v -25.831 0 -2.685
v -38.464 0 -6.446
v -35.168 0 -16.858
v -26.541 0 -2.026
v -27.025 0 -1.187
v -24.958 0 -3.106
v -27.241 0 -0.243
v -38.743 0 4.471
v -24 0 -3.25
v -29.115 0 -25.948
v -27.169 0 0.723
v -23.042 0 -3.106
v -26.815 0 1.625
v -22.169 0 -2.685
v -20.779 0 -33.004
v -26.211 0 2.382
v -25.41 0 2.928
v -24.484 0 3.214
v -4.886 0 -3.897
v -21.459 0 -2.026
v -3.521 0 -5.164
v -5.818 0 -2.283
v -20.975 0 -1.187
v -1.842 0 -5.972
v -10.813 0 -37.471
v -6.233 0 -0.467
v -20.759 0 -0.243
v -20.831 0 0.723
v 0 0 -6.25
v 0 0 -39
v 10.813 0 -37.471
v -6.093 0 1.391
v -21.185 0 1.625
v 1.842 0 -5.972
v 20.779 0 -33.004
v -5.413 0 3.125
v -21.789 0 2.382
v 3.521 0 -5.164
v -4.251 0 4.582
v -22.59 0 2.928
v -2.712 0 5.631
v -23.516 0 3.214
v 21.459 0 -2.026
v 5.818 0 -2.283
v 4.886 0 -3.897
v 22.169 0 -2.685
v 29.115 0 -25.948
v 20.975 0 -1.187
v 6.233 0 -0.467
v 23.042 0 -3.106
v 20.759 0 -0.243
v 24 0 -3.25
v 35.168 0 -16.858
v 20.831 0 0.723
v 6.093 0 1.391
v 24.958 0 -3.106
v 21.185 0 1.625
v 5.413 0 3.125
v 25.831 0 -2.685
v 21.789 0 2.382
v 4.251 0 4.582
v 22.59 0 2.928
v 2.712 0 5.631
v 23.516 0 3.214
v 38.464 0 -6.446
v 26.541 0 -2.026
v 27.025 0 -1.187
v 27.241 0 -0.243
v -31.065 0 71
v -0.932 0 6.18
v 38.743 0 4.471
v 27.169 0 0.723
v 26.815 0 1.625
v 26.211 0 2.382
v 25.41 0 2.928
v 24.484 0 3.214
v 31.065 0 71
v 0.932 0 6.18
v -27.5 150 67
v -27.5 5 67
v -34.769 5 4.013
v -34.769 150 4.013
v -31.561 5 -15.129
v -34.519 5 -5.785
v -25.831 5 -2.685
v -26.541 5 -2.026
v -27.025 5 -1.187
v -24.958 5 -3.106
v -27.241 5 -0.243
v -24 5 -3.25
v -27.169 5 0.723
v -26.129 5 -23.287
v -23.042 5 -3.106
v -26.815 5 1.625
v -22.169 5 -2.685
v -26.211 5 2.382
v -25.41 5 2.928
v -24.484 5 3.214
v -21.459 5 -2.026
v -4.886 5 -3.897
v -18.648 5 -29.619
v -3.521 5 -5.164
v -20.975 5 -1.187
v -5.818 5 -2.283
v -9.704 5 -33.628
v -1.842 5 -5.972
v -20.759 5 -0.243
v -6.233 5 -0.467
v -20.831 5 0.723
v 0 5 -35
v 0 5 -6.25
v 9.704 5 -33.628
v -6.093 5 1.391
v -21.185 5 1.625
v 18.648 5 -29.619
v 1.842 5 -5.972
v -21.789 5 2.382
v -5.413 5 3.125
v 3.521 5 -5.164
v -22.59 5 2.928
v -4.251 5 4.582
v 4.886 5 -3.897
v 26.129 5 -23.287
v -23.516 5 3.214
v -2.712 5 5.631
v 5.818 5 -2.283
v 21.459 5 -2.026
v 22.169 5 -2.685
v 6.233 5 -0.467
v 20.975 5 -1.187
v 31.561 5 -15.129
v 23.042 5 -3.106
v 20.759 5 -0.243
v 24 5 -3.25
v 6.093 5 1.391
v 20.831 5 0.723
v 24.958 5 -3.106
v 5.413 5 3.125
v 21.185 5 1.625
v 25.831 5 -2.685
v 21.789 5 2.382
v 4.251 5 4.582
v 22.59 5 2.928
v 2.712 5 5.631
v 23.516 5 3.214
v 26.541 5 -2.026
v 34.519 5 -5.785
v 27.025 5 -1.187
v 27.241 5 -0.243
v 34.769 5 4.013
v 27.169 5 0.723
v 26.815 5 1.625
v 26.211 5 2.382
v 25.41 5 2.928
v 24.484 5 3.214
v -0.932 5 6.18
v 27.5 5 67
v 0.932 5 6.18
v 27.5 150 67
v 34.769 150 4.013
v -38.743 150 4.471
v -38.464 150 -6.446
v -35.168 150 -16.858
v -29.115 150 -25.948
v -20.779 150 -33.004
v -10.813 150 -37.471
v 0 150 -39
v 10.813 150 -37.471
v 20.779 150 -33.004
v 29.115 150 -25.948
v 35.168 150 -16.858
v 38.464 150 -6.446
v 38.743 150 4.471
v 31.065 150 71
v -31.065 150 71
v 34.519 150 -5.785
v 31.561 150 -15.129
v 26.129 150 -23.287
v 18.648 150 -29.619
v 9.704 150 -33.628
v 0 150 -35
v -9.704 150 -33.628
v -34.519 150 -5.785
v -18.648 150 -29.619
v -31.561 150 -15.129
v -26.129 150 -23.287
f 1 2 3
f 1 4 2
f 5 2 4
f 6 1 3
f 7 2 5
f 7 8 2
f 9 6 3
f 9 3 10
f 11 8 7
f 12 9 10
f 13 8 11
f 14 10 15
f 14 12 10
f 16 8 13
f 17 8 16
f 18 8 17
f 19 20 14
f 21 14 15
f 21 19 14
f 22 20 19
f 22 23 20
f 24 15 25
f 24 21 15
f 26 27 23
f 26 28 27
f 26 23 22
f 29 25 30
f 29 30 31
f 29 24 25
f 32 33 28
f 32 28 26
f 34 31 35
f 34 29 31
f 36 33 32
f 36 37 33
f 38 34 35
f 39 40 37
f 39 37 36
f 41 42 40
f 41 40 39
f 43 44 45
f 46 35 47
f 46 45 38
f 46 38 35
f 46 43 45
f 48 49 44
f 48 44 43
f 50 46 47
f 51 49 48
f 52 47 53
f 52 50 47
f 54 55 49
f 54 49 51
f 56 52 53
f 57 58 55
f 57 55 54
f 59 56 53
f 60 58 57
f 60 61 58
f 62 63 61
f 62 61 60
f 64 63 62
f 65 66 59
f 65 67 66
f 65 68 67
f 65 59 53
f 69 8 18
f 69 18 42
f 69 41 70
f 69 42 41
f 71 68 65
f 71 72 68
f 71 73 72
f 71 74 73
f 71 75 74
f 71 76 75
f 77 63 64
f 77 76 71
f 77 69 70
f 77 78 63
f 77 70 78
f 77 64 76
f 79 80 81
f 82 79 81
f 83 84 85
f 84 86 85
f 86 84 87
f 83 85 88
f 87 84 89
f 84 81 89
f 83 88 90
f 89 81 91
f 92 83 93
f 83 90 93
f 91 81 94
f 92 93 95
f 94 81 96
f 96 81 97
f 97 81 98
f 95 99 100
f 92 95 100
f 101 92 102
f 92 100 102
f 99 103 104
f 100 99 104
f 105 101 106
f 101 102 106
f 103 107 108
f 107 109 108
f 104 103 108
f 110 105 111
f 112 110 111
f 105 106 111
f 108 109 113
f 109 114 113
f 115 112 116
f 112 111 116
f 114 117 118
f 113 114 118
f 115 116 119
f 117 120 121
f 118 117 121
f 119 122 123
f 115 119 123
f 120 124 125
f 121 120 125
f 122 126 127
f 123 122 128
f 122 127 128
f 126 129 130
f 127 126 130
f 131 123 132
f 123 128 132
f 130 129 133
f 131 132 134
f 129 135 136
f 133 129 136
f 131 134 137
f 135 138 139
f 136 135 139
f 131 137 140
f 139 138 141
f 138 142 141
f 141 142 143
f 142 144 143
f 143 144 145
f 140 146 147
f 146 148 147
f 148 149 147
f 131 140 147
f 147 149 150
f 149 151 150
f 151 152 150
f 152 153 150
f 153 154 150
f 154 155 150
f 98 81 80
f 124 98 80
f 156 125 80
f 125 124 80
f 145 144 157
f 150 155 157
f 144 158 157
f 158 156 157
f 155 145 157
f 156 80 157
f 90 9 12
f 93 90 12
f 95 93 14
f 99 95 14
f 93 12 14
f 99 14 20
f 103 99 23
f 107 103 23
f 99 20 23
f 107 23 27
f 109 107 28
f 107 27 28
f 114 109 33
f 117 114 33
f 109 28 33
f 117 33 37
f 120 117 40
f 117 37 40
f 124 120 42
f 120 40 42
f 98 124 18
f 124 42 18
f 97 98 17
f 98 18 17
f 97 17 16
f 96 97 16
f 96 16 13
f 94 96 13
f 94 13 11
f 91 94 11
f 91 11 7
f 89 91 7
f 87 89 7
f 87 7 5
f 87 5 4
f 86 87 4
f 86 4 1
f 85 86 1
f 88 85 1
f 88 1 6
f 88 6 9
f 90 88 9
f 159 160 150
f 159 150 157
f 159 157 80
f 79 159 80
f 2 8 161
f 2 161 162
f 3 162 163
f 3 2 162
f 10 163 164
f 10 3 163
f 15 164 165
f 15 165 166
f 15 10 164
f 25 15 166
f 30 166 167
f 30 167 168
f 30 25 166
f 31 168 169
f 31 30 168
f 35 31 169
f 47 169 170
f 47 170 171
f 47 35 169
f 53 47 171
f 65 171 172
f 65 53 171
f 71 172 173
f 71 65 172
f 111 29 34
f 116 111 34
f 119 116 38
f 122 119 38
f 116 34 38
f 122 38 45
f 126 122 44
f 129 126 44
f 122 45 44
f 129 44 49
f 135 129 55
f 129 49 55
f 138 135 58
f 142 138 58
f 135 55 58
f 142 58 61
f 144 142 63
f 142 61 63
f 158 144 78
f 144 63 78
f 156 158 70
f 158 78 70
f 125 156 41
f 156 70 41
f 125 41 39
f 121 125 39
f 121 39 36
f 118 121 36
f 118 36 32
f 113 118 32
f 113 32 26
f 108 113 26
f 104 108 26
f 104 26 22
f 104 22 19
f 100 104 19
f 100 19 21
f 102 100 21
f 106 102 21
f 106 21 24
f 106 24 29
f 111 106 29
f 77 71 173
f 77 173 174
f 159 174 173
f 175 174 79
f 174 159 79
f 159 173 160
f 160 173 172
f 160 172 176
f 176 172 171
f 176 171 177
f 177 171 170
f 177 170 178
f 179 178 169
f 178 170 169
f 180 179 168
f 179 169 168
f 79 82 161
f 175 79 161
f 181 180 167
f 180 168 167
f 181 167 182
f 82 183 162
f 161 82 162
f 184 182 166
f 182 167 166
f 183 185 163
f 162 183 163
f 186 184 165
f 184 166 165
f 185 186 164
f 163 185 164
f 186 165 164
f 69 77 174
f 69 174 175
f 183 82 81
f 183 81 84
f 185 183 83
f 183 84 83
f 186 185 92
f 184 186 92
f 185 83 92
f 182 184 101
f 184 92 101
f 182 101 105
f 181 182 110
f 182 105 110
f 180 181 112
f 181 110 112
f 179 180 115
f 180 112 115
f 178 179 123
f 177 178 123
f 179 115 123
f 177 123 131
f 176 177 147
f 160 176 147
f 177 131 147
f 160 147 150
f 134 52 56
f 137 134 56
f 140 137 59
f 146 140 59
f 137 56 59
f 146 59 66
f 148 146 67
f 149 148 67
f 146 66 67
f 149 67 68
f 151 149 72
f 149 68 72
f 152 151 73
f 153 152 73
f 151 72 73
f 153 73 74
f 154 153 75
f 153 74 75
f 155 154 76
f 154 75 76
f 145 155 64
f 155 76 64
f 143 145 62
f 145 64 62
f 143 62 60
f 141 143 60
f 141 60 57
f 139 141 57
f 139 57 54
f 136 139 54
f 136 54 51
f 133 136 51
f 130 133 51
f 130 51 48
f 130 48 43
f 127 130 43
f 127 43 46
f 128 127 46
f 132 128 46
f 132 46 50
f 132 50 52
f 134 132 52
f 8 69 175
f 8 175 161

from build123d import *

# Parameters (mm, degrees)
BOSS_EXTRUDE1_DEPTH = 150
BOSS_EXTRUDE2_DEPTH = 5
CUT_EXTRUDE2_REACH  = 172.476
SKETCH6_R           = 6.25
CUT_EXTRUDE3_REACH  = 172.476
SKETCH7_R           = 3.25


with BuildPart() as part:
    # Sketch3 → Boss-Extrude1 (new body)
    with BuildSketch(Plane(origin=(0, 0, 0), x_dir=(1, 0, 0), z_dir=(0, 1, 0))):
        with BuildLine():
            Line((-31.064919271, -71), (-38.742847032, -4.471219502))
            ThreePointArc((-38.742847032, -4.471219502), (0, 39), (38.742847032, -4.471219502))
            Line((38.742847032, -4.471219502), (31.064919271, -71))
            Line((31.064919271, -71), (0, -71))
            Line((0, -71), (-31.064919271, -71))
        make_face()
        with BuildLine():
            Line((0, -67), (-27.5, -67))
            Line((-27.5, -67), (-34.769221696, -4.012632886))
            ThreePointArc((-34.769221696, -4.012632886), (0, 35), (34.769221696, -4.012632886))
            Line((34.769221696, -4.012632886), (27.5, -67))
            Line((27.5, -67), (0, -67))
        make_face(mode=Mode.SUBTRACT)
    extrude(amount=BOSS_EXTRUDE1_DEPTH)

    # Sketch4 → Boss-Extrude2 (add)
    with BuildSketch(Plane.XZ):
        with BuildLine():
            Line((-27.5, 67), (-34.769221696, 4.012632886))
            ThreePointArc((-34.769221696, 4.012632886), (0, -35), (34.769221696, 4.012632886))
            Line((34.769221696, 4.012632886), (27.5, 67))
            Line((27.5, 67), (-27.5, 67))
        make_face()
    extrude(amount=-BOSS_EXTRUDE2_DEPTH)

    # Sketch6 → Cut-Extrude2 (cut, up to next)
    with BuildSketch(Plane.XZ, mode=Mode.PRIVATE) as cut_extrude2_sk1:
        with Locations(Location((0, 0, 0), (0, 0, 270))):
            Circle(SKETCH6_R)
    cut_extrude2_tool1 = extrude(cut_extrude2_sk1.sketch, amount=-CUT_EXTRUDE2_REACH, mode=Mode.PRIVATE) & part.part
    add(cut_extrude2_tool1.solids().sort_by_distance((0, 0, 0))[0], mode=Mode.SUBTRACT)

    # Sketch7 → Cut-Extrude3 (cut, up to next)
    with BuildSketch(Plane.XZ, mode=Mode.PRIVATE) as cut_extrude3_sk1:
        with Locations(Location((24, 0, 0), (0, 0, 270))):
            Circle(SKETCH7_R)
    cut_extrude3_tool1 = extrude(cut_extrude3_sk1.sketch, amount=-CUT_EXTRUDE3_REACH, mode=Mode.PRIVATE) & part.part
    # Sketch7 → Cut-Extrude3 (cut, up to next)
    with BuildSketch(Plane.XZ, mode=Mode.PRIVATE) as cut_extrude3_sk2:
        with Locations(Location((-24, 0, 0), (0, 0, 270))):
            Circle(SKETCH7_R)
    cut_extrude3_tool2 = extrude(cut_extrude3_sk2.sketch, amount=-CUT_EXTRUDE3_REACH, mode=Mode.PRIVATE) & part.part
    add(cut_extrude3_tool1.solids().sort_by_distance((24, 0, 0))[0], mode=Mode.SUBTRACT)
    add(cut_extrude3_tool2.solids().sort_by_distance((-24, 0, 0))[0], mode=Mode.SUBTRACT)


solid = part.part
